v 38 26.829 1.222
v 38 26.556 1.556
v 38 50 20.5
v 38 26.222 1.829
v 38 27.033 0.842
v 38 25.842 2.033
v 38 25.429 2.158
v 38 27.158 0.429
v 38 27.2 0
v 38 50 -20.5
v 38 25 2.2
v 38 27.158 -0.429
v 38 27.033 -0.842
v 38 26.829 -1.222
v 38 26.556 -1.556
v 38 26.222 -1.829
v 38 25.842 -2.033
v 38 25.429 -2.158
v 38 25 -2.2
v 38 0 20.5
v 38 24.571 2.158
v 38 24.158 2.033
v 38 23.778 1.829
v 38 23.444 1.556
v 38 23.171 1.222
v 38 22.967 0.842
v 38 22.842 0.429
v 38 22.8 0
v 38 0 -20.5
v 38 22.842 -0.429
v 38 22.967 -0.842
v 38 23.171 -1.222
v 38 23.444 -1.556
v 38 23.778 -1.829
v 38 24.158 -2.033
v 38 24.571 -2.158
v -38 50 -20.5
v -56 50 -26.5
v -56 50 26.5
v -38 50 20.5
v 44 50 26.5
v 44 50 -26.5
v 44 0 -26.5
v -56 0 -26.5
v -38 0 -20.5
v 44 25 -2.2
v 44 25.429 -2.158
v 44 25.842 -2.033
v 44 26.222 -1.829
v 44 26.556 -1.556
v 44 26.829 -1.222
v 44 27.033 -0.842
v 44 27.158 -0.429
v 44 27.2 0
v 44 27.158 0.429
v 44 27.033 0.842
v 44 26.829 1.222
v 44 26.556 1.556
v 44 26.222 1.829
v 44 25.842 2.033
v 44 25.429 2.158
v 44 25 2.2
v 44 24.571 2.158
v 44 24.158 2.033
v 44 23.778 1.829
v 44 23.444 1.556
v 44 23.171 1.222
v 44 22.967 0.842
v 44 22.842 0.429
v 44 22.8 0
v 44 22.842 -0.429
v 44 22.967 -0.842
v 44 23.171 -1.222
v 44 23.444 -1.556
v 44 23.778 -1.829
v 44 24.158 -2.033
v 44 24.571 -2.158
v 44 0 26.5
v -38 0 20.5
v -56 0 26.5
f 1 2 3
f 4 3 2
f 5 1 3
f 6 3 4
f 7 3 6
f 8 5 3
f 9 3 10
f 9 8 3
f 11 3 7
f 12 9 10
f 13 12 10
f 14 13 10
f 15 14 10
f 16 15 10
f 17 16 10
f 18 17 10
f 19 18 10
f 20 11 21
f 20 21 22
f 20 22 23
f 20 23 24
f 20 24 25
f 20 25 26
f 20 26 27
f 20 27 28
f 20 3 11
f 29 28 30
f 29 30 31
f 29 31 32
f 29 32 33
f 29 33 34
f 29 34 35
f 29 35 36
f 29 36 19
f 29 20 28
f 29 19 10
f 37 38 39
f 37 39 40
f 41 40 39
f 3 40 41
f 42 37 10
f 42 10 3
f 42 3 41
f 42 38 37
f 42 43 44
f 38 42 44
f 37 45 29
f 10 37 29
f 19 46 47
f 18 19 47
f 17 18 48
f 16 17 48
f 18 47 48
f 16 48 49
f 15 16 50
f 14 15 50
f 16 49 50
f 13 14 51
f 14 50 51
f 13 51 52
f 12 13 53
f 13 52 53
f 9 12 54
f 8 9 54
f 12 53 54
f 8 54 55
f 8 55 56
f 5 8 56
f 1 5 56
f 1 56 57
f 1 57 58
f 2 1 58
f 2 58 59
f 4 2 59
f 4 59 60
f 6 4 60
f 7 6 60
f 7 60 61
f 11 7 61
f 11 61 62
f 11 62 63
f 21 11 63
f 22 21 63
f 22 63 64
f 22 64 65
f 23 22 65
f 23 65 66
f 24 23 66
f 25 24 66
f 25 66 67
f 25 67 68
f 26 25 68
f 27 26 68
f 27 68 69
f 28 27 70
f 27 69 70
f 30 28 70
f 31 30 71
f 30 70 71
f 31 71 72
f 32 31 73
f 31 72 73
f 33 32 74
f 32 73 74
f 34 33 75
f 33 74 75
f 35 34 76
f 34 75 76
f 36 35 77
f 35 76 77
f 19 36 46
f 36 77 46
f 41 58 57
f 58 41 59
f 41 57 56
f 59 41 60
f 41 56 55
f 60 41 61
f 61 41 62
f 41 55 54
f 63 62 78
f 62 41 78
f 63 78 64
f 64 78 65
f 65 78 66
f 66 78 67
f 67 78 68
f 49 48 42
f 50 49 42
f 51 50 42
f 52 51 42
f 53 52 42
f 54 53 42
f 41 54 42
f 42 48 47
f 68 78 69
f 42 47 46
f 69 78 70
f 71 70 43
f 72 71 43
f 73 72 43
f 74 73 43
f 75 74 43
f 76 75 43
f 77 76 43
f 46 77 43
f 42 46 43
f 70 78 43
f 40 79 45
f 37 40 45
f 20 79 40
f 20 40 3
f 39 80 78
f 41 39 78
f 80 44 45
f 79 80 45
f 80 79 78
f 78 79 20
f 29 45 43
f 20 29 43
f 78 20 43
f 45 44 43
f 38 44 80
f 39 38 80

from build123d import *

# Parameters (mm, degrees)
SKETCH_2_W          = 76
SKETCH_2_H          = 41
EXTRUDE_1_DEPTH     = 50
CUT_EXTRUDE_1_REACH = 102
SKETCH_3_R          = 2.2


with BuildPart() as part:
    # 草图2 → 凸台-拉伸1 (new body)
    with BuildSketch(Plane(origin=(0, 0, 0), x_dir=(1, 0, 0), z_dir=(0, 1, 0))):
        Polygon((-38, -26.5), (44, -26.5), (44, 26.5), (-38, 26.5), (-56, 26.5), (-56, -26.5), align=None)
        Rectangle(SKETCH_2_W, SKETCH_2_H, mode=Mode.SUBTRACT)
    extrude(amount=EXTRUDE_1_DEPTH)

    # 草图3 → 切除-拉伸1 (cut, up to next)
    with BuildSketch(Plane(origin=(44, 0, 0), x_dir=(0, 0, -1), z_dir=(1, 0, 0)), mode=Mode.PRIVATE) as cut_extrude_1_sk1:
        with Locations((0, 25)):
            Circle(SKETCH_3_R)
    cut_extrude_1_tool1 = extrude(cut_extrude_1_sk1.sketch, amount=-CUT_EXTRUDE_1_REACH, mode=Mode.PRIVATE) & part.part
    add(cut_extrude_1_tool1.solids().sort_by_distance((44, 25, 0))[0], mode=Mode.SUBTRACT)


solid = part.part
